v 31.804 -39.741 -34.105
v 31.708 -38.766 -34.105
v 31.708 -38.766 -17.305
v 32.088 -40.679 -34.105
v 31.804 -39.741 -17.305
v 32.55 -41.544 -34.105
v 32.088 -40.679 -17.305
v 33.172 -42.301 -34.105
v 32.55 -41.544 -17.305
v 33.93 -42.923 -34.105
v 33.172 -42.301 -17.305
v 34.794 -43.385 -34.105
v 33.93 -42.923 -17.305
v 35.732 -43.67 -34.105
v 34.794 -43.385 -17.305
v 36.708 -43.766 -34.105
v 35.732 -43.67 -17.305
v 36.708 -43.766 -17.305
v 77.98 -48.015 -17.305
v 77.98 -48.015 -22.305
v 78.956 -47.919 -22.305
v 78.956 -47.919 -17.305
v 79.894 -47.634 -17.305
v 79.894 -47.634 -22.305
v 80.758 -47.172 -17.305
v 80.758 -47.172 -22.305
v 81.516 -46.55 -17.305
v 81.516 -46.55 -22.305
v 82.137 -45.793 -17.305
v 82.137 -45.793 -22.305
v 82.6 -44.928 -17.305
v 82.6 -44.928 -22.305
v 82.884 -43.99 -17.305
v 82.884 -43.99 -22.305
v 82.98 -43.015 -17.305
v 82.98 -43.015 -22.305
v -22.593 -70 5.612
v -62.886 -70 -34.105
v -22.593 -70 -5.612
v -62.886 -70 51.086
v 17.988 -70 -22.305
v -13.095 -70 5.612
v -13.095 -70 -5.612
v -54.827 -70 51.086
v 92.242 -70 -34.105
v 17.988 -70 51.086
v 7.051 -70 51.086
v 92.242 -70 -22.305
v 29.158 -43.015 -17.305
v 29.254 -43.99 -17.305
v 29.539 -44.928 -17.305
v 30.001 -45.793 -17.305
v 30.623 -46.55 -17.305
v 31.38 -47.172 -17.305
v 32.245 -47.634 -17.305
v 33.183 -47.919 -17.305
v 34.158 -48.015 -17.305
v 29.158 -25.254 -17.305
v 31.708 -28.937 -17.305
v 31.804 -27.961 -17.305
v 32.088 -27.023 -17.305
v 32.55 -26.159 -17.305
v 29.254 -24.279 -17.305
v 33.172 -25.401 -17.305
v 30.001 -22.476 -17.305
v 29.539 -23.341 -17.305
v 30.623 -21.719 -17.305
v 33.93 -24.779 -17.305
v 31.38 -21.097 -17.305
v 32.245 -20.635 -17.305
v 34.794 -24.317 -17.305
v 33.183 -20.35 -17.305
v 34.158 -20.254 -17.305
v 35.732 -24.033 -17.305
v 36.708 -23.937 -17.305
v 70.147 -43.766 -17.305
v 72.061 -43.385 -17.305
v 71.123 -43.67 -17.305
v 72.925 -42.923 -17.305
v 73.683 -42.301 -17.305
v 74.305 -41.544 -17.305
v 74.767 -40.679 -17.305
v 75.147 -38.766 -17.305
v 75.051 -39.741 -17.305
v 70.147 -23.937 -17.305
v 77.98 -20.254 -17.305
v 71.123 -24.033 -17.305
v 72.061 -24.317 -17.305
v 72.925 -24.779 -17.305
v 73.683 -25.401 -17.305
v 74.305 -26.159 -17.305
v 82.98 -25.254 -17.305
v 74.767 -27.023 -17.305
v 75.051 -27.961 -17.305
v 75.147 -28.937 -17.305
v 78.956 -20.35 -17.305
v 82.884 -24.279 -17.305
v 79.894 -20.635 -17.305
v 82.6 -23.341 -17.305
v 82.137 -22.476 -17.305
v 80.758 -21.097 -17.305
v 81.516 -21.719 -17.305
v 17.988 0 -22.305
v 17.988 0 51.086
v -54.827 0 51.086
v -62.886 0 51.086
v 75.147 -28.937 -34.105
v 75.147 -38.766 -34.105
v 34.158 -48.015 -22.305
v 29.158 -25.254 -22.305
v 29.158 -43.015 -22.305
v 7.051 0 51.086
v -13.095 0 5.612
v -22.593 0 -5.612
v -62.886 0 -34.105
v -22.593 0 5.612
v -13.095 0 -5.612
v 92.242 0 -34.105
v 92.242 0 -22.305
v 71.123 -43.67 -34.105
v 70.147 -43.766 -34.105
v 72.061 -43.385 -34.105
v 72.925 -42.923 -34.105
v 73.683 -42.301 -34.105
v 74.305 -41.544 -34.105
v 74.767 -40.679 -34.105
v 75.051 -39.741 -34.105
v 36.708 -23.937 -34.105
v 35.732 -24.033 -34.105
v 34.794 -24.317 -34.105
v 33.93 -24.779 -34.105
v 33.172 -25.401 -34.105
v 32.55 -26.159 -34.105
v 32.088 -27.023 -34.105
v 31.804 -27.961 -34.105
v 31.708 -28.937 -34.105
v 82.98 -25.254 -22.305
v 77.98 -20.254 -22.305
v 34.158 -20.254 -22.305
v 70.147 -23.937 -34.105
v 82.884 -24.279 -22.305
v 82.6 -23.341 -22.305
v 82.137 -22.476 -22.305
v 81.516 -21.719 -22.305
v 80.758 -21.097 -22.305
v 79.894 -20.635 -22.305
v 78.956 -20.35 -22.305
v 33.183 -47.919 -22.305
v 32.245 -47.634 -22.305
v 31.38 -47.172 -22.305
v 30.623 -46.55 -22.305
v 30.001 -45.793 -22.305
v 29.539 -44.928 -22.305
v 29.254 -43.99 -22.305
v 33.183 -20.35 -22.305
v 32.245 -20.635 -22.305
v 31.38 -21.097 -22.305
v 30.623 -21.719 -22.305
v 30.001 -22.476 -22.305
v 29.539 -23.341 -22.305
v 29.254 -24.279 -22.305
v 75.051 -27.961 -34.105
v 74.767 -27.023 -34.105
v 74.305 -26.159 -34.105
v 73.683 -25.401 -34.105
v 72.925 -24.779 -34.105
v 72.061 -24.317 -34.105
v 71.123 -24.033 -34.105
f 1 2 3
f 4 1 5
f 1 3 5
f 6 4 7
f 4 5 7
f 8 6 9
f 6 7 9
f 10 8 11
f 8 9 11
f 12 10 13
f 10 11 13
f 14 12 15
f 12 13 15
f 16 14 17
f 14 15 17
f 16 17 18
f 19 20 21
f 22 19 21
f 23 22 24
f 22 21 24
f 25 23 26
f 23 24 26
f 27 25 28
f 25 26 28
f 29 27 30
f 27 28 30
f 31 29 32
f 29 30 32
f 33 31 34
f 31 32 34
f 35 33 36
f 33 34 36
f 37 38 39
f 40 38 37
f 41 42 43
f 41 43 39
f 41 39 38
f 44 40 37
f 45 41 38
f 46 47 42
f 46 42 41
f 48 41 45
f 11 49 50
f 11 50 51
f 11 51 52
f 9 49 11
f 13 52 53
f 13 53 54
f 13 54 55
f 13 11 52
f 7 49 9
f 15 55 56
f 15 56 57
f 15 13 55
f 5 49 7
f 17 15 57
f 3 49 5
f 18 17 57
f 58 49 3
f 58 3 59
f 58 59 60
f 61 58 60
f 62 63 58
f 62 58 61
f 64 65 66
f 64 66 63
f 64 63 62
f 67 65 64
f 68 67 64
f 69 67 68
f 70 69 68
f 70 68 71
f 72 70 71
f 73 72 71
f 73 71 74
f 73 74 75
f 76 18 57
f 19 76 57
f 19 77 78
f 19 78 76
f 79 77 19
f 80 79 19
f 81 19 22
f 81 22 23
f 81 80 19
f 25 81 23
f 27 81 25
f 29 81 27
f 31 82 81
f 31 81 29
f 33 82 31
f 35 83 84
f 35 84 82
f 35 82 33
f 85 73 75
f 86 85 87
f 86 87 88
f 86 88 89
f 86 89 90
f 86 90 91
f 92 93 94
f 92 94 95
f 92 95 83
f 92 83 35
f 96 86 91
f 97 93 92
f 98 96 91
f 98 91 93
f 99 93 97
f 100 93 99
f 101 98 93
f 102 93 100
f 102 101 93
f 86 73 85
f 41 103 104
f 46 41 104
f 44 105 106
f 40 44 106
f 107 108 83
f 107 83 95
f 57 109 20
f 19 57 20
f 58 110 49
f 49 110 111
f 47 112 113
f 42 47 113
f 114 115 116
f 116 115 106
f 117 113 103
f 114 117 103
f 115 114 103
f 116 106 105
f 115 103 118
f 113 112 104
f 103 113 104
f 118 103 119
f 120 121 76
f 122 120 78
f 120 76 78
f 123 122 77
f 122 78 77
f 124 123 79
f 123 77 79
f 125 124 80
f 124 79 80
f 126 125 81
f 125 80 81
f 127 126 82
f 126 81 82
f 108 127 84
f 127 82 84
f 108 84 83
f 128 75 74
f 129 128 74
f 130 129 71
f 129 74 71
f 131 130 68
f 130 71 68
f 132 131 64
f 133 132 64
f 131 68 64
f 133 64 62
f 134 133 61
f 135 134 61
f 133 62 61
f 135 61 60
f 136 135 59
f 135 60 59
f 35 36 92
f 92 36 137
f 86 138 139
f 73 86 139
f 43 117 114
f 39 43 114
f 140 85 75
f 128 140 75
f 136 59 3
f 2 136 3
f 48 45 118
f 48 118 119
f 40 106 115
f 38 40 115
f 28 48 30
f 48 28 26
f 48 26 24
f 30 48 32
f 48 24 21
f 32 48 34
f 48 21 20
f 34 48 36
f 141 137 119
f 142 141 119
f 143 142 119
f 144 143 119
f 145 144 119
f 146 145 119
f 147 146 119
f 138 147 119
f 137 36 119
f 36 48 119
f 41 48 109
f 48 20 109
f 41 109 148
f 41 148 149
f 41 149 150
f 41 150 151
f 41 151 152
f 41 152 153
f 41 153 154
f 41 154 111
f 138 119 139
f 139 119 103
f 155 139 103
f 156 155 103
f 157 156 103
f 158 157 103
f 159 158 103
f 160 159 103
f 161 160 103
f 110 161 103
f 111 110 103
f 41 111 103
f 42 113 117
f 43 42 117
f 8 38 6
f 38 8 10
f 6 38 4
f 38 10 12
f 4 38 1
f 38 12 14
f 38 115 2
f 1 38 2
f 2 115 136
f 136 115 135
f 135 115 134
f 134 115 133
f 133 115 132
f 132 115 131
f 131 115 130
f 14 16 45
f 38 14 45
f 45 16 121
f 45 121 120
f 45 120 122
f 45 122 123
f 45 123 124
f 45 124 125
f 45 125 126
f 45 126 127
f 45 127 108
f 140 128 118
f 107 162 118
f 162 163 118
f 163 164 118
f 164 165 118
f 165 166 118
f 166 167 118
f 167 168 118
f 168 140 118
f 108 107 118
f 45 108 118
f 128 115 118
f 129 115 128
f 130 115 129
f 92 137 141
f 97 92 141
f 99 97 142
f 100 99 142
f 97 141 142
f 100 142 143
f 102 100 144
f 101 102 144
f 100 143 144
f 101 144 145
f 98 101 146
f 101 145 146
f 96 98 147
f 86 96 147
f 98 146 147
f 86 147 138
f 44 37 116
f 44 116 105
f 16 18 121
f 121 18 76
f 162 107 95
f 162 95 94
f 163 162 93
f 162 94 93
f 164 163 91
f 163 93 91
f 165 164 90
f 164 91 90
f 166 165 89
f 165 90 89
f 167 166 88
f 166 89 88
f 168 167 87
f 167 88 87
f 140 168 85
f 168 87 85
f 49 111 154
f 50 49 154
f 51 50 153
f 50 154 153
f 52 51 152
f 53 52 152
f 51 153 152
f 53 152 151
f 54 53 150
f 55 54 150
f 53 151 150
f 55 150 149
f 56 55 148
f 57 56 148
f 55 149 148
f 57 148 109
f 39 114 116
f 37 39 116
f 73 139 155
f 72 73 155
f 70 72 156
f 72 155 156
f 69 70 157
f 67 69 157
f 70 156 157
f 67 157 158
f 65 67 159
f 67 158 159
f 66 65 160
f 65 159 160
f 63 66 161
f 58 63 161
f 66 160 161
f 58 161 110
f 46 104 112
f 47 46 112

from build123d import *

# Parameters (mm, degrees)
F1_DEPTH = 70
F3_DEPTH = 5
F4_DEPTH = 25


with BuildPart() as f1:
    # F0 (on Front) → F1 (new body)
    with BuildSketch(Plane.XZ):
        Polygon((-54.826997, 51.085521), (-62.88556, 51.085521), (-62.88556, -34.104981), (92.241742, -34.104981), (92.241742, -22.304947), (17.98786, -22.304947), (17.98786, 51.085521), (7.051241, 51.085521), (-13.095161, 5.612212), (-13.095161, -5.612212), (-22.592751, -5.612212), (-22.592751, 5.612212), align=None)
    extrude(amount=F1_DEPTH)

    # F2 (on face) → F3 (join)
    with BuildSketch(Plane.XY.offset(-22.304947)):
        with BuildLine():
            Line((77.980134, -20.254048), (34.15819, -20.254048))
            ThreePointArc((34.15819, -20.254048), (30.622656, -21.718514), (29.15819, -25.254048))
            Line((29.15819, -25.254048), (29.15819, -43.014842))
            ThreePointArc((29.15819, -43.014842), (30.622656, -46.550376), (34.15819, -48.014842))
            Line((34.15819, -48.014842), (77.980134, -48.014842))
            ThreePointArc((77.980134, -48.014842), (81.515667, -46.550376), (82.980134, -43.014842))
            Line((82.980134, -43.014842), (82.980134, -25.254048))
            ThreePointArc((82.980134, -25.254048), (81.515667, -21.718514), (77.980134, -20.254048))
        make_face()
        with BuildLine():
            ThreePointArc((31.707652, -28.936601), (33.172118, -25.401067), (36.707652, -23.936601))
            Line((36.707652, -23.936601), (70.1474, -23.936601))
            ThreePointArc((70.1474, -23.936601), (73.682934, -25.401067), (75.1474, -28.936601))
            Line((75.1474, -28.936601), (75.1474, -38.765739))
            ThreePointArc((75.1474, -38.765739), (73.682934, -42.301273), (70.1474, -43.765739))
            Line((70.1474, -43.765739), (36.707652, -43.765739))
            ThreePointArc((36.707652, -43.765739), (33.172118, -42.301273), (31.707652, -38.765739))
            Line((31.707652, -38.765739), (31.707652, -28.936601))
        make_face(mode=Mode.SUBTRACT)
    extrude(amount=F3_DEPTH)

    # F3_face (on face) → F4 (cut)
    with BuildSketch(Plane(origin=(53.427526, -33.85117, -22.304947), x_dir=(1, 0, 0), z_dir=(0, 0, 1))):
        with BuildLine():
            Line((-21.719874, 4.914569), (-21.719874, -4.914569))
            ThreePointArc((-21.719874, -4.914569), (-20.255408, -8.450103), (-16.719874, -9.914569))
            Line((-16.719874, -9.914569), (16.719874, -9.914569))
            ThreePointArc((16.719874, -9.914569), (20.255408, -8.450103), (21.719874, -4.914569))
            Line((21.719874, -4.914569), (21.719874, 4.914569))
            ThreePointArc((21.719874, 4.914569), (20.255408, 8.450103), (16.719874, 9.914569))
            Line((16.719874, 9.914569), (-16.719874, 9.914569))
            ThreePointArc((-16.719874, 9.914569), (-20.255408, 8.450103), (-21.719874, 4.914569))
        make_face()
    extrude(amount=-F4_DEPTH, mode=Mode.SUBTRACT)


solid = f1.part
